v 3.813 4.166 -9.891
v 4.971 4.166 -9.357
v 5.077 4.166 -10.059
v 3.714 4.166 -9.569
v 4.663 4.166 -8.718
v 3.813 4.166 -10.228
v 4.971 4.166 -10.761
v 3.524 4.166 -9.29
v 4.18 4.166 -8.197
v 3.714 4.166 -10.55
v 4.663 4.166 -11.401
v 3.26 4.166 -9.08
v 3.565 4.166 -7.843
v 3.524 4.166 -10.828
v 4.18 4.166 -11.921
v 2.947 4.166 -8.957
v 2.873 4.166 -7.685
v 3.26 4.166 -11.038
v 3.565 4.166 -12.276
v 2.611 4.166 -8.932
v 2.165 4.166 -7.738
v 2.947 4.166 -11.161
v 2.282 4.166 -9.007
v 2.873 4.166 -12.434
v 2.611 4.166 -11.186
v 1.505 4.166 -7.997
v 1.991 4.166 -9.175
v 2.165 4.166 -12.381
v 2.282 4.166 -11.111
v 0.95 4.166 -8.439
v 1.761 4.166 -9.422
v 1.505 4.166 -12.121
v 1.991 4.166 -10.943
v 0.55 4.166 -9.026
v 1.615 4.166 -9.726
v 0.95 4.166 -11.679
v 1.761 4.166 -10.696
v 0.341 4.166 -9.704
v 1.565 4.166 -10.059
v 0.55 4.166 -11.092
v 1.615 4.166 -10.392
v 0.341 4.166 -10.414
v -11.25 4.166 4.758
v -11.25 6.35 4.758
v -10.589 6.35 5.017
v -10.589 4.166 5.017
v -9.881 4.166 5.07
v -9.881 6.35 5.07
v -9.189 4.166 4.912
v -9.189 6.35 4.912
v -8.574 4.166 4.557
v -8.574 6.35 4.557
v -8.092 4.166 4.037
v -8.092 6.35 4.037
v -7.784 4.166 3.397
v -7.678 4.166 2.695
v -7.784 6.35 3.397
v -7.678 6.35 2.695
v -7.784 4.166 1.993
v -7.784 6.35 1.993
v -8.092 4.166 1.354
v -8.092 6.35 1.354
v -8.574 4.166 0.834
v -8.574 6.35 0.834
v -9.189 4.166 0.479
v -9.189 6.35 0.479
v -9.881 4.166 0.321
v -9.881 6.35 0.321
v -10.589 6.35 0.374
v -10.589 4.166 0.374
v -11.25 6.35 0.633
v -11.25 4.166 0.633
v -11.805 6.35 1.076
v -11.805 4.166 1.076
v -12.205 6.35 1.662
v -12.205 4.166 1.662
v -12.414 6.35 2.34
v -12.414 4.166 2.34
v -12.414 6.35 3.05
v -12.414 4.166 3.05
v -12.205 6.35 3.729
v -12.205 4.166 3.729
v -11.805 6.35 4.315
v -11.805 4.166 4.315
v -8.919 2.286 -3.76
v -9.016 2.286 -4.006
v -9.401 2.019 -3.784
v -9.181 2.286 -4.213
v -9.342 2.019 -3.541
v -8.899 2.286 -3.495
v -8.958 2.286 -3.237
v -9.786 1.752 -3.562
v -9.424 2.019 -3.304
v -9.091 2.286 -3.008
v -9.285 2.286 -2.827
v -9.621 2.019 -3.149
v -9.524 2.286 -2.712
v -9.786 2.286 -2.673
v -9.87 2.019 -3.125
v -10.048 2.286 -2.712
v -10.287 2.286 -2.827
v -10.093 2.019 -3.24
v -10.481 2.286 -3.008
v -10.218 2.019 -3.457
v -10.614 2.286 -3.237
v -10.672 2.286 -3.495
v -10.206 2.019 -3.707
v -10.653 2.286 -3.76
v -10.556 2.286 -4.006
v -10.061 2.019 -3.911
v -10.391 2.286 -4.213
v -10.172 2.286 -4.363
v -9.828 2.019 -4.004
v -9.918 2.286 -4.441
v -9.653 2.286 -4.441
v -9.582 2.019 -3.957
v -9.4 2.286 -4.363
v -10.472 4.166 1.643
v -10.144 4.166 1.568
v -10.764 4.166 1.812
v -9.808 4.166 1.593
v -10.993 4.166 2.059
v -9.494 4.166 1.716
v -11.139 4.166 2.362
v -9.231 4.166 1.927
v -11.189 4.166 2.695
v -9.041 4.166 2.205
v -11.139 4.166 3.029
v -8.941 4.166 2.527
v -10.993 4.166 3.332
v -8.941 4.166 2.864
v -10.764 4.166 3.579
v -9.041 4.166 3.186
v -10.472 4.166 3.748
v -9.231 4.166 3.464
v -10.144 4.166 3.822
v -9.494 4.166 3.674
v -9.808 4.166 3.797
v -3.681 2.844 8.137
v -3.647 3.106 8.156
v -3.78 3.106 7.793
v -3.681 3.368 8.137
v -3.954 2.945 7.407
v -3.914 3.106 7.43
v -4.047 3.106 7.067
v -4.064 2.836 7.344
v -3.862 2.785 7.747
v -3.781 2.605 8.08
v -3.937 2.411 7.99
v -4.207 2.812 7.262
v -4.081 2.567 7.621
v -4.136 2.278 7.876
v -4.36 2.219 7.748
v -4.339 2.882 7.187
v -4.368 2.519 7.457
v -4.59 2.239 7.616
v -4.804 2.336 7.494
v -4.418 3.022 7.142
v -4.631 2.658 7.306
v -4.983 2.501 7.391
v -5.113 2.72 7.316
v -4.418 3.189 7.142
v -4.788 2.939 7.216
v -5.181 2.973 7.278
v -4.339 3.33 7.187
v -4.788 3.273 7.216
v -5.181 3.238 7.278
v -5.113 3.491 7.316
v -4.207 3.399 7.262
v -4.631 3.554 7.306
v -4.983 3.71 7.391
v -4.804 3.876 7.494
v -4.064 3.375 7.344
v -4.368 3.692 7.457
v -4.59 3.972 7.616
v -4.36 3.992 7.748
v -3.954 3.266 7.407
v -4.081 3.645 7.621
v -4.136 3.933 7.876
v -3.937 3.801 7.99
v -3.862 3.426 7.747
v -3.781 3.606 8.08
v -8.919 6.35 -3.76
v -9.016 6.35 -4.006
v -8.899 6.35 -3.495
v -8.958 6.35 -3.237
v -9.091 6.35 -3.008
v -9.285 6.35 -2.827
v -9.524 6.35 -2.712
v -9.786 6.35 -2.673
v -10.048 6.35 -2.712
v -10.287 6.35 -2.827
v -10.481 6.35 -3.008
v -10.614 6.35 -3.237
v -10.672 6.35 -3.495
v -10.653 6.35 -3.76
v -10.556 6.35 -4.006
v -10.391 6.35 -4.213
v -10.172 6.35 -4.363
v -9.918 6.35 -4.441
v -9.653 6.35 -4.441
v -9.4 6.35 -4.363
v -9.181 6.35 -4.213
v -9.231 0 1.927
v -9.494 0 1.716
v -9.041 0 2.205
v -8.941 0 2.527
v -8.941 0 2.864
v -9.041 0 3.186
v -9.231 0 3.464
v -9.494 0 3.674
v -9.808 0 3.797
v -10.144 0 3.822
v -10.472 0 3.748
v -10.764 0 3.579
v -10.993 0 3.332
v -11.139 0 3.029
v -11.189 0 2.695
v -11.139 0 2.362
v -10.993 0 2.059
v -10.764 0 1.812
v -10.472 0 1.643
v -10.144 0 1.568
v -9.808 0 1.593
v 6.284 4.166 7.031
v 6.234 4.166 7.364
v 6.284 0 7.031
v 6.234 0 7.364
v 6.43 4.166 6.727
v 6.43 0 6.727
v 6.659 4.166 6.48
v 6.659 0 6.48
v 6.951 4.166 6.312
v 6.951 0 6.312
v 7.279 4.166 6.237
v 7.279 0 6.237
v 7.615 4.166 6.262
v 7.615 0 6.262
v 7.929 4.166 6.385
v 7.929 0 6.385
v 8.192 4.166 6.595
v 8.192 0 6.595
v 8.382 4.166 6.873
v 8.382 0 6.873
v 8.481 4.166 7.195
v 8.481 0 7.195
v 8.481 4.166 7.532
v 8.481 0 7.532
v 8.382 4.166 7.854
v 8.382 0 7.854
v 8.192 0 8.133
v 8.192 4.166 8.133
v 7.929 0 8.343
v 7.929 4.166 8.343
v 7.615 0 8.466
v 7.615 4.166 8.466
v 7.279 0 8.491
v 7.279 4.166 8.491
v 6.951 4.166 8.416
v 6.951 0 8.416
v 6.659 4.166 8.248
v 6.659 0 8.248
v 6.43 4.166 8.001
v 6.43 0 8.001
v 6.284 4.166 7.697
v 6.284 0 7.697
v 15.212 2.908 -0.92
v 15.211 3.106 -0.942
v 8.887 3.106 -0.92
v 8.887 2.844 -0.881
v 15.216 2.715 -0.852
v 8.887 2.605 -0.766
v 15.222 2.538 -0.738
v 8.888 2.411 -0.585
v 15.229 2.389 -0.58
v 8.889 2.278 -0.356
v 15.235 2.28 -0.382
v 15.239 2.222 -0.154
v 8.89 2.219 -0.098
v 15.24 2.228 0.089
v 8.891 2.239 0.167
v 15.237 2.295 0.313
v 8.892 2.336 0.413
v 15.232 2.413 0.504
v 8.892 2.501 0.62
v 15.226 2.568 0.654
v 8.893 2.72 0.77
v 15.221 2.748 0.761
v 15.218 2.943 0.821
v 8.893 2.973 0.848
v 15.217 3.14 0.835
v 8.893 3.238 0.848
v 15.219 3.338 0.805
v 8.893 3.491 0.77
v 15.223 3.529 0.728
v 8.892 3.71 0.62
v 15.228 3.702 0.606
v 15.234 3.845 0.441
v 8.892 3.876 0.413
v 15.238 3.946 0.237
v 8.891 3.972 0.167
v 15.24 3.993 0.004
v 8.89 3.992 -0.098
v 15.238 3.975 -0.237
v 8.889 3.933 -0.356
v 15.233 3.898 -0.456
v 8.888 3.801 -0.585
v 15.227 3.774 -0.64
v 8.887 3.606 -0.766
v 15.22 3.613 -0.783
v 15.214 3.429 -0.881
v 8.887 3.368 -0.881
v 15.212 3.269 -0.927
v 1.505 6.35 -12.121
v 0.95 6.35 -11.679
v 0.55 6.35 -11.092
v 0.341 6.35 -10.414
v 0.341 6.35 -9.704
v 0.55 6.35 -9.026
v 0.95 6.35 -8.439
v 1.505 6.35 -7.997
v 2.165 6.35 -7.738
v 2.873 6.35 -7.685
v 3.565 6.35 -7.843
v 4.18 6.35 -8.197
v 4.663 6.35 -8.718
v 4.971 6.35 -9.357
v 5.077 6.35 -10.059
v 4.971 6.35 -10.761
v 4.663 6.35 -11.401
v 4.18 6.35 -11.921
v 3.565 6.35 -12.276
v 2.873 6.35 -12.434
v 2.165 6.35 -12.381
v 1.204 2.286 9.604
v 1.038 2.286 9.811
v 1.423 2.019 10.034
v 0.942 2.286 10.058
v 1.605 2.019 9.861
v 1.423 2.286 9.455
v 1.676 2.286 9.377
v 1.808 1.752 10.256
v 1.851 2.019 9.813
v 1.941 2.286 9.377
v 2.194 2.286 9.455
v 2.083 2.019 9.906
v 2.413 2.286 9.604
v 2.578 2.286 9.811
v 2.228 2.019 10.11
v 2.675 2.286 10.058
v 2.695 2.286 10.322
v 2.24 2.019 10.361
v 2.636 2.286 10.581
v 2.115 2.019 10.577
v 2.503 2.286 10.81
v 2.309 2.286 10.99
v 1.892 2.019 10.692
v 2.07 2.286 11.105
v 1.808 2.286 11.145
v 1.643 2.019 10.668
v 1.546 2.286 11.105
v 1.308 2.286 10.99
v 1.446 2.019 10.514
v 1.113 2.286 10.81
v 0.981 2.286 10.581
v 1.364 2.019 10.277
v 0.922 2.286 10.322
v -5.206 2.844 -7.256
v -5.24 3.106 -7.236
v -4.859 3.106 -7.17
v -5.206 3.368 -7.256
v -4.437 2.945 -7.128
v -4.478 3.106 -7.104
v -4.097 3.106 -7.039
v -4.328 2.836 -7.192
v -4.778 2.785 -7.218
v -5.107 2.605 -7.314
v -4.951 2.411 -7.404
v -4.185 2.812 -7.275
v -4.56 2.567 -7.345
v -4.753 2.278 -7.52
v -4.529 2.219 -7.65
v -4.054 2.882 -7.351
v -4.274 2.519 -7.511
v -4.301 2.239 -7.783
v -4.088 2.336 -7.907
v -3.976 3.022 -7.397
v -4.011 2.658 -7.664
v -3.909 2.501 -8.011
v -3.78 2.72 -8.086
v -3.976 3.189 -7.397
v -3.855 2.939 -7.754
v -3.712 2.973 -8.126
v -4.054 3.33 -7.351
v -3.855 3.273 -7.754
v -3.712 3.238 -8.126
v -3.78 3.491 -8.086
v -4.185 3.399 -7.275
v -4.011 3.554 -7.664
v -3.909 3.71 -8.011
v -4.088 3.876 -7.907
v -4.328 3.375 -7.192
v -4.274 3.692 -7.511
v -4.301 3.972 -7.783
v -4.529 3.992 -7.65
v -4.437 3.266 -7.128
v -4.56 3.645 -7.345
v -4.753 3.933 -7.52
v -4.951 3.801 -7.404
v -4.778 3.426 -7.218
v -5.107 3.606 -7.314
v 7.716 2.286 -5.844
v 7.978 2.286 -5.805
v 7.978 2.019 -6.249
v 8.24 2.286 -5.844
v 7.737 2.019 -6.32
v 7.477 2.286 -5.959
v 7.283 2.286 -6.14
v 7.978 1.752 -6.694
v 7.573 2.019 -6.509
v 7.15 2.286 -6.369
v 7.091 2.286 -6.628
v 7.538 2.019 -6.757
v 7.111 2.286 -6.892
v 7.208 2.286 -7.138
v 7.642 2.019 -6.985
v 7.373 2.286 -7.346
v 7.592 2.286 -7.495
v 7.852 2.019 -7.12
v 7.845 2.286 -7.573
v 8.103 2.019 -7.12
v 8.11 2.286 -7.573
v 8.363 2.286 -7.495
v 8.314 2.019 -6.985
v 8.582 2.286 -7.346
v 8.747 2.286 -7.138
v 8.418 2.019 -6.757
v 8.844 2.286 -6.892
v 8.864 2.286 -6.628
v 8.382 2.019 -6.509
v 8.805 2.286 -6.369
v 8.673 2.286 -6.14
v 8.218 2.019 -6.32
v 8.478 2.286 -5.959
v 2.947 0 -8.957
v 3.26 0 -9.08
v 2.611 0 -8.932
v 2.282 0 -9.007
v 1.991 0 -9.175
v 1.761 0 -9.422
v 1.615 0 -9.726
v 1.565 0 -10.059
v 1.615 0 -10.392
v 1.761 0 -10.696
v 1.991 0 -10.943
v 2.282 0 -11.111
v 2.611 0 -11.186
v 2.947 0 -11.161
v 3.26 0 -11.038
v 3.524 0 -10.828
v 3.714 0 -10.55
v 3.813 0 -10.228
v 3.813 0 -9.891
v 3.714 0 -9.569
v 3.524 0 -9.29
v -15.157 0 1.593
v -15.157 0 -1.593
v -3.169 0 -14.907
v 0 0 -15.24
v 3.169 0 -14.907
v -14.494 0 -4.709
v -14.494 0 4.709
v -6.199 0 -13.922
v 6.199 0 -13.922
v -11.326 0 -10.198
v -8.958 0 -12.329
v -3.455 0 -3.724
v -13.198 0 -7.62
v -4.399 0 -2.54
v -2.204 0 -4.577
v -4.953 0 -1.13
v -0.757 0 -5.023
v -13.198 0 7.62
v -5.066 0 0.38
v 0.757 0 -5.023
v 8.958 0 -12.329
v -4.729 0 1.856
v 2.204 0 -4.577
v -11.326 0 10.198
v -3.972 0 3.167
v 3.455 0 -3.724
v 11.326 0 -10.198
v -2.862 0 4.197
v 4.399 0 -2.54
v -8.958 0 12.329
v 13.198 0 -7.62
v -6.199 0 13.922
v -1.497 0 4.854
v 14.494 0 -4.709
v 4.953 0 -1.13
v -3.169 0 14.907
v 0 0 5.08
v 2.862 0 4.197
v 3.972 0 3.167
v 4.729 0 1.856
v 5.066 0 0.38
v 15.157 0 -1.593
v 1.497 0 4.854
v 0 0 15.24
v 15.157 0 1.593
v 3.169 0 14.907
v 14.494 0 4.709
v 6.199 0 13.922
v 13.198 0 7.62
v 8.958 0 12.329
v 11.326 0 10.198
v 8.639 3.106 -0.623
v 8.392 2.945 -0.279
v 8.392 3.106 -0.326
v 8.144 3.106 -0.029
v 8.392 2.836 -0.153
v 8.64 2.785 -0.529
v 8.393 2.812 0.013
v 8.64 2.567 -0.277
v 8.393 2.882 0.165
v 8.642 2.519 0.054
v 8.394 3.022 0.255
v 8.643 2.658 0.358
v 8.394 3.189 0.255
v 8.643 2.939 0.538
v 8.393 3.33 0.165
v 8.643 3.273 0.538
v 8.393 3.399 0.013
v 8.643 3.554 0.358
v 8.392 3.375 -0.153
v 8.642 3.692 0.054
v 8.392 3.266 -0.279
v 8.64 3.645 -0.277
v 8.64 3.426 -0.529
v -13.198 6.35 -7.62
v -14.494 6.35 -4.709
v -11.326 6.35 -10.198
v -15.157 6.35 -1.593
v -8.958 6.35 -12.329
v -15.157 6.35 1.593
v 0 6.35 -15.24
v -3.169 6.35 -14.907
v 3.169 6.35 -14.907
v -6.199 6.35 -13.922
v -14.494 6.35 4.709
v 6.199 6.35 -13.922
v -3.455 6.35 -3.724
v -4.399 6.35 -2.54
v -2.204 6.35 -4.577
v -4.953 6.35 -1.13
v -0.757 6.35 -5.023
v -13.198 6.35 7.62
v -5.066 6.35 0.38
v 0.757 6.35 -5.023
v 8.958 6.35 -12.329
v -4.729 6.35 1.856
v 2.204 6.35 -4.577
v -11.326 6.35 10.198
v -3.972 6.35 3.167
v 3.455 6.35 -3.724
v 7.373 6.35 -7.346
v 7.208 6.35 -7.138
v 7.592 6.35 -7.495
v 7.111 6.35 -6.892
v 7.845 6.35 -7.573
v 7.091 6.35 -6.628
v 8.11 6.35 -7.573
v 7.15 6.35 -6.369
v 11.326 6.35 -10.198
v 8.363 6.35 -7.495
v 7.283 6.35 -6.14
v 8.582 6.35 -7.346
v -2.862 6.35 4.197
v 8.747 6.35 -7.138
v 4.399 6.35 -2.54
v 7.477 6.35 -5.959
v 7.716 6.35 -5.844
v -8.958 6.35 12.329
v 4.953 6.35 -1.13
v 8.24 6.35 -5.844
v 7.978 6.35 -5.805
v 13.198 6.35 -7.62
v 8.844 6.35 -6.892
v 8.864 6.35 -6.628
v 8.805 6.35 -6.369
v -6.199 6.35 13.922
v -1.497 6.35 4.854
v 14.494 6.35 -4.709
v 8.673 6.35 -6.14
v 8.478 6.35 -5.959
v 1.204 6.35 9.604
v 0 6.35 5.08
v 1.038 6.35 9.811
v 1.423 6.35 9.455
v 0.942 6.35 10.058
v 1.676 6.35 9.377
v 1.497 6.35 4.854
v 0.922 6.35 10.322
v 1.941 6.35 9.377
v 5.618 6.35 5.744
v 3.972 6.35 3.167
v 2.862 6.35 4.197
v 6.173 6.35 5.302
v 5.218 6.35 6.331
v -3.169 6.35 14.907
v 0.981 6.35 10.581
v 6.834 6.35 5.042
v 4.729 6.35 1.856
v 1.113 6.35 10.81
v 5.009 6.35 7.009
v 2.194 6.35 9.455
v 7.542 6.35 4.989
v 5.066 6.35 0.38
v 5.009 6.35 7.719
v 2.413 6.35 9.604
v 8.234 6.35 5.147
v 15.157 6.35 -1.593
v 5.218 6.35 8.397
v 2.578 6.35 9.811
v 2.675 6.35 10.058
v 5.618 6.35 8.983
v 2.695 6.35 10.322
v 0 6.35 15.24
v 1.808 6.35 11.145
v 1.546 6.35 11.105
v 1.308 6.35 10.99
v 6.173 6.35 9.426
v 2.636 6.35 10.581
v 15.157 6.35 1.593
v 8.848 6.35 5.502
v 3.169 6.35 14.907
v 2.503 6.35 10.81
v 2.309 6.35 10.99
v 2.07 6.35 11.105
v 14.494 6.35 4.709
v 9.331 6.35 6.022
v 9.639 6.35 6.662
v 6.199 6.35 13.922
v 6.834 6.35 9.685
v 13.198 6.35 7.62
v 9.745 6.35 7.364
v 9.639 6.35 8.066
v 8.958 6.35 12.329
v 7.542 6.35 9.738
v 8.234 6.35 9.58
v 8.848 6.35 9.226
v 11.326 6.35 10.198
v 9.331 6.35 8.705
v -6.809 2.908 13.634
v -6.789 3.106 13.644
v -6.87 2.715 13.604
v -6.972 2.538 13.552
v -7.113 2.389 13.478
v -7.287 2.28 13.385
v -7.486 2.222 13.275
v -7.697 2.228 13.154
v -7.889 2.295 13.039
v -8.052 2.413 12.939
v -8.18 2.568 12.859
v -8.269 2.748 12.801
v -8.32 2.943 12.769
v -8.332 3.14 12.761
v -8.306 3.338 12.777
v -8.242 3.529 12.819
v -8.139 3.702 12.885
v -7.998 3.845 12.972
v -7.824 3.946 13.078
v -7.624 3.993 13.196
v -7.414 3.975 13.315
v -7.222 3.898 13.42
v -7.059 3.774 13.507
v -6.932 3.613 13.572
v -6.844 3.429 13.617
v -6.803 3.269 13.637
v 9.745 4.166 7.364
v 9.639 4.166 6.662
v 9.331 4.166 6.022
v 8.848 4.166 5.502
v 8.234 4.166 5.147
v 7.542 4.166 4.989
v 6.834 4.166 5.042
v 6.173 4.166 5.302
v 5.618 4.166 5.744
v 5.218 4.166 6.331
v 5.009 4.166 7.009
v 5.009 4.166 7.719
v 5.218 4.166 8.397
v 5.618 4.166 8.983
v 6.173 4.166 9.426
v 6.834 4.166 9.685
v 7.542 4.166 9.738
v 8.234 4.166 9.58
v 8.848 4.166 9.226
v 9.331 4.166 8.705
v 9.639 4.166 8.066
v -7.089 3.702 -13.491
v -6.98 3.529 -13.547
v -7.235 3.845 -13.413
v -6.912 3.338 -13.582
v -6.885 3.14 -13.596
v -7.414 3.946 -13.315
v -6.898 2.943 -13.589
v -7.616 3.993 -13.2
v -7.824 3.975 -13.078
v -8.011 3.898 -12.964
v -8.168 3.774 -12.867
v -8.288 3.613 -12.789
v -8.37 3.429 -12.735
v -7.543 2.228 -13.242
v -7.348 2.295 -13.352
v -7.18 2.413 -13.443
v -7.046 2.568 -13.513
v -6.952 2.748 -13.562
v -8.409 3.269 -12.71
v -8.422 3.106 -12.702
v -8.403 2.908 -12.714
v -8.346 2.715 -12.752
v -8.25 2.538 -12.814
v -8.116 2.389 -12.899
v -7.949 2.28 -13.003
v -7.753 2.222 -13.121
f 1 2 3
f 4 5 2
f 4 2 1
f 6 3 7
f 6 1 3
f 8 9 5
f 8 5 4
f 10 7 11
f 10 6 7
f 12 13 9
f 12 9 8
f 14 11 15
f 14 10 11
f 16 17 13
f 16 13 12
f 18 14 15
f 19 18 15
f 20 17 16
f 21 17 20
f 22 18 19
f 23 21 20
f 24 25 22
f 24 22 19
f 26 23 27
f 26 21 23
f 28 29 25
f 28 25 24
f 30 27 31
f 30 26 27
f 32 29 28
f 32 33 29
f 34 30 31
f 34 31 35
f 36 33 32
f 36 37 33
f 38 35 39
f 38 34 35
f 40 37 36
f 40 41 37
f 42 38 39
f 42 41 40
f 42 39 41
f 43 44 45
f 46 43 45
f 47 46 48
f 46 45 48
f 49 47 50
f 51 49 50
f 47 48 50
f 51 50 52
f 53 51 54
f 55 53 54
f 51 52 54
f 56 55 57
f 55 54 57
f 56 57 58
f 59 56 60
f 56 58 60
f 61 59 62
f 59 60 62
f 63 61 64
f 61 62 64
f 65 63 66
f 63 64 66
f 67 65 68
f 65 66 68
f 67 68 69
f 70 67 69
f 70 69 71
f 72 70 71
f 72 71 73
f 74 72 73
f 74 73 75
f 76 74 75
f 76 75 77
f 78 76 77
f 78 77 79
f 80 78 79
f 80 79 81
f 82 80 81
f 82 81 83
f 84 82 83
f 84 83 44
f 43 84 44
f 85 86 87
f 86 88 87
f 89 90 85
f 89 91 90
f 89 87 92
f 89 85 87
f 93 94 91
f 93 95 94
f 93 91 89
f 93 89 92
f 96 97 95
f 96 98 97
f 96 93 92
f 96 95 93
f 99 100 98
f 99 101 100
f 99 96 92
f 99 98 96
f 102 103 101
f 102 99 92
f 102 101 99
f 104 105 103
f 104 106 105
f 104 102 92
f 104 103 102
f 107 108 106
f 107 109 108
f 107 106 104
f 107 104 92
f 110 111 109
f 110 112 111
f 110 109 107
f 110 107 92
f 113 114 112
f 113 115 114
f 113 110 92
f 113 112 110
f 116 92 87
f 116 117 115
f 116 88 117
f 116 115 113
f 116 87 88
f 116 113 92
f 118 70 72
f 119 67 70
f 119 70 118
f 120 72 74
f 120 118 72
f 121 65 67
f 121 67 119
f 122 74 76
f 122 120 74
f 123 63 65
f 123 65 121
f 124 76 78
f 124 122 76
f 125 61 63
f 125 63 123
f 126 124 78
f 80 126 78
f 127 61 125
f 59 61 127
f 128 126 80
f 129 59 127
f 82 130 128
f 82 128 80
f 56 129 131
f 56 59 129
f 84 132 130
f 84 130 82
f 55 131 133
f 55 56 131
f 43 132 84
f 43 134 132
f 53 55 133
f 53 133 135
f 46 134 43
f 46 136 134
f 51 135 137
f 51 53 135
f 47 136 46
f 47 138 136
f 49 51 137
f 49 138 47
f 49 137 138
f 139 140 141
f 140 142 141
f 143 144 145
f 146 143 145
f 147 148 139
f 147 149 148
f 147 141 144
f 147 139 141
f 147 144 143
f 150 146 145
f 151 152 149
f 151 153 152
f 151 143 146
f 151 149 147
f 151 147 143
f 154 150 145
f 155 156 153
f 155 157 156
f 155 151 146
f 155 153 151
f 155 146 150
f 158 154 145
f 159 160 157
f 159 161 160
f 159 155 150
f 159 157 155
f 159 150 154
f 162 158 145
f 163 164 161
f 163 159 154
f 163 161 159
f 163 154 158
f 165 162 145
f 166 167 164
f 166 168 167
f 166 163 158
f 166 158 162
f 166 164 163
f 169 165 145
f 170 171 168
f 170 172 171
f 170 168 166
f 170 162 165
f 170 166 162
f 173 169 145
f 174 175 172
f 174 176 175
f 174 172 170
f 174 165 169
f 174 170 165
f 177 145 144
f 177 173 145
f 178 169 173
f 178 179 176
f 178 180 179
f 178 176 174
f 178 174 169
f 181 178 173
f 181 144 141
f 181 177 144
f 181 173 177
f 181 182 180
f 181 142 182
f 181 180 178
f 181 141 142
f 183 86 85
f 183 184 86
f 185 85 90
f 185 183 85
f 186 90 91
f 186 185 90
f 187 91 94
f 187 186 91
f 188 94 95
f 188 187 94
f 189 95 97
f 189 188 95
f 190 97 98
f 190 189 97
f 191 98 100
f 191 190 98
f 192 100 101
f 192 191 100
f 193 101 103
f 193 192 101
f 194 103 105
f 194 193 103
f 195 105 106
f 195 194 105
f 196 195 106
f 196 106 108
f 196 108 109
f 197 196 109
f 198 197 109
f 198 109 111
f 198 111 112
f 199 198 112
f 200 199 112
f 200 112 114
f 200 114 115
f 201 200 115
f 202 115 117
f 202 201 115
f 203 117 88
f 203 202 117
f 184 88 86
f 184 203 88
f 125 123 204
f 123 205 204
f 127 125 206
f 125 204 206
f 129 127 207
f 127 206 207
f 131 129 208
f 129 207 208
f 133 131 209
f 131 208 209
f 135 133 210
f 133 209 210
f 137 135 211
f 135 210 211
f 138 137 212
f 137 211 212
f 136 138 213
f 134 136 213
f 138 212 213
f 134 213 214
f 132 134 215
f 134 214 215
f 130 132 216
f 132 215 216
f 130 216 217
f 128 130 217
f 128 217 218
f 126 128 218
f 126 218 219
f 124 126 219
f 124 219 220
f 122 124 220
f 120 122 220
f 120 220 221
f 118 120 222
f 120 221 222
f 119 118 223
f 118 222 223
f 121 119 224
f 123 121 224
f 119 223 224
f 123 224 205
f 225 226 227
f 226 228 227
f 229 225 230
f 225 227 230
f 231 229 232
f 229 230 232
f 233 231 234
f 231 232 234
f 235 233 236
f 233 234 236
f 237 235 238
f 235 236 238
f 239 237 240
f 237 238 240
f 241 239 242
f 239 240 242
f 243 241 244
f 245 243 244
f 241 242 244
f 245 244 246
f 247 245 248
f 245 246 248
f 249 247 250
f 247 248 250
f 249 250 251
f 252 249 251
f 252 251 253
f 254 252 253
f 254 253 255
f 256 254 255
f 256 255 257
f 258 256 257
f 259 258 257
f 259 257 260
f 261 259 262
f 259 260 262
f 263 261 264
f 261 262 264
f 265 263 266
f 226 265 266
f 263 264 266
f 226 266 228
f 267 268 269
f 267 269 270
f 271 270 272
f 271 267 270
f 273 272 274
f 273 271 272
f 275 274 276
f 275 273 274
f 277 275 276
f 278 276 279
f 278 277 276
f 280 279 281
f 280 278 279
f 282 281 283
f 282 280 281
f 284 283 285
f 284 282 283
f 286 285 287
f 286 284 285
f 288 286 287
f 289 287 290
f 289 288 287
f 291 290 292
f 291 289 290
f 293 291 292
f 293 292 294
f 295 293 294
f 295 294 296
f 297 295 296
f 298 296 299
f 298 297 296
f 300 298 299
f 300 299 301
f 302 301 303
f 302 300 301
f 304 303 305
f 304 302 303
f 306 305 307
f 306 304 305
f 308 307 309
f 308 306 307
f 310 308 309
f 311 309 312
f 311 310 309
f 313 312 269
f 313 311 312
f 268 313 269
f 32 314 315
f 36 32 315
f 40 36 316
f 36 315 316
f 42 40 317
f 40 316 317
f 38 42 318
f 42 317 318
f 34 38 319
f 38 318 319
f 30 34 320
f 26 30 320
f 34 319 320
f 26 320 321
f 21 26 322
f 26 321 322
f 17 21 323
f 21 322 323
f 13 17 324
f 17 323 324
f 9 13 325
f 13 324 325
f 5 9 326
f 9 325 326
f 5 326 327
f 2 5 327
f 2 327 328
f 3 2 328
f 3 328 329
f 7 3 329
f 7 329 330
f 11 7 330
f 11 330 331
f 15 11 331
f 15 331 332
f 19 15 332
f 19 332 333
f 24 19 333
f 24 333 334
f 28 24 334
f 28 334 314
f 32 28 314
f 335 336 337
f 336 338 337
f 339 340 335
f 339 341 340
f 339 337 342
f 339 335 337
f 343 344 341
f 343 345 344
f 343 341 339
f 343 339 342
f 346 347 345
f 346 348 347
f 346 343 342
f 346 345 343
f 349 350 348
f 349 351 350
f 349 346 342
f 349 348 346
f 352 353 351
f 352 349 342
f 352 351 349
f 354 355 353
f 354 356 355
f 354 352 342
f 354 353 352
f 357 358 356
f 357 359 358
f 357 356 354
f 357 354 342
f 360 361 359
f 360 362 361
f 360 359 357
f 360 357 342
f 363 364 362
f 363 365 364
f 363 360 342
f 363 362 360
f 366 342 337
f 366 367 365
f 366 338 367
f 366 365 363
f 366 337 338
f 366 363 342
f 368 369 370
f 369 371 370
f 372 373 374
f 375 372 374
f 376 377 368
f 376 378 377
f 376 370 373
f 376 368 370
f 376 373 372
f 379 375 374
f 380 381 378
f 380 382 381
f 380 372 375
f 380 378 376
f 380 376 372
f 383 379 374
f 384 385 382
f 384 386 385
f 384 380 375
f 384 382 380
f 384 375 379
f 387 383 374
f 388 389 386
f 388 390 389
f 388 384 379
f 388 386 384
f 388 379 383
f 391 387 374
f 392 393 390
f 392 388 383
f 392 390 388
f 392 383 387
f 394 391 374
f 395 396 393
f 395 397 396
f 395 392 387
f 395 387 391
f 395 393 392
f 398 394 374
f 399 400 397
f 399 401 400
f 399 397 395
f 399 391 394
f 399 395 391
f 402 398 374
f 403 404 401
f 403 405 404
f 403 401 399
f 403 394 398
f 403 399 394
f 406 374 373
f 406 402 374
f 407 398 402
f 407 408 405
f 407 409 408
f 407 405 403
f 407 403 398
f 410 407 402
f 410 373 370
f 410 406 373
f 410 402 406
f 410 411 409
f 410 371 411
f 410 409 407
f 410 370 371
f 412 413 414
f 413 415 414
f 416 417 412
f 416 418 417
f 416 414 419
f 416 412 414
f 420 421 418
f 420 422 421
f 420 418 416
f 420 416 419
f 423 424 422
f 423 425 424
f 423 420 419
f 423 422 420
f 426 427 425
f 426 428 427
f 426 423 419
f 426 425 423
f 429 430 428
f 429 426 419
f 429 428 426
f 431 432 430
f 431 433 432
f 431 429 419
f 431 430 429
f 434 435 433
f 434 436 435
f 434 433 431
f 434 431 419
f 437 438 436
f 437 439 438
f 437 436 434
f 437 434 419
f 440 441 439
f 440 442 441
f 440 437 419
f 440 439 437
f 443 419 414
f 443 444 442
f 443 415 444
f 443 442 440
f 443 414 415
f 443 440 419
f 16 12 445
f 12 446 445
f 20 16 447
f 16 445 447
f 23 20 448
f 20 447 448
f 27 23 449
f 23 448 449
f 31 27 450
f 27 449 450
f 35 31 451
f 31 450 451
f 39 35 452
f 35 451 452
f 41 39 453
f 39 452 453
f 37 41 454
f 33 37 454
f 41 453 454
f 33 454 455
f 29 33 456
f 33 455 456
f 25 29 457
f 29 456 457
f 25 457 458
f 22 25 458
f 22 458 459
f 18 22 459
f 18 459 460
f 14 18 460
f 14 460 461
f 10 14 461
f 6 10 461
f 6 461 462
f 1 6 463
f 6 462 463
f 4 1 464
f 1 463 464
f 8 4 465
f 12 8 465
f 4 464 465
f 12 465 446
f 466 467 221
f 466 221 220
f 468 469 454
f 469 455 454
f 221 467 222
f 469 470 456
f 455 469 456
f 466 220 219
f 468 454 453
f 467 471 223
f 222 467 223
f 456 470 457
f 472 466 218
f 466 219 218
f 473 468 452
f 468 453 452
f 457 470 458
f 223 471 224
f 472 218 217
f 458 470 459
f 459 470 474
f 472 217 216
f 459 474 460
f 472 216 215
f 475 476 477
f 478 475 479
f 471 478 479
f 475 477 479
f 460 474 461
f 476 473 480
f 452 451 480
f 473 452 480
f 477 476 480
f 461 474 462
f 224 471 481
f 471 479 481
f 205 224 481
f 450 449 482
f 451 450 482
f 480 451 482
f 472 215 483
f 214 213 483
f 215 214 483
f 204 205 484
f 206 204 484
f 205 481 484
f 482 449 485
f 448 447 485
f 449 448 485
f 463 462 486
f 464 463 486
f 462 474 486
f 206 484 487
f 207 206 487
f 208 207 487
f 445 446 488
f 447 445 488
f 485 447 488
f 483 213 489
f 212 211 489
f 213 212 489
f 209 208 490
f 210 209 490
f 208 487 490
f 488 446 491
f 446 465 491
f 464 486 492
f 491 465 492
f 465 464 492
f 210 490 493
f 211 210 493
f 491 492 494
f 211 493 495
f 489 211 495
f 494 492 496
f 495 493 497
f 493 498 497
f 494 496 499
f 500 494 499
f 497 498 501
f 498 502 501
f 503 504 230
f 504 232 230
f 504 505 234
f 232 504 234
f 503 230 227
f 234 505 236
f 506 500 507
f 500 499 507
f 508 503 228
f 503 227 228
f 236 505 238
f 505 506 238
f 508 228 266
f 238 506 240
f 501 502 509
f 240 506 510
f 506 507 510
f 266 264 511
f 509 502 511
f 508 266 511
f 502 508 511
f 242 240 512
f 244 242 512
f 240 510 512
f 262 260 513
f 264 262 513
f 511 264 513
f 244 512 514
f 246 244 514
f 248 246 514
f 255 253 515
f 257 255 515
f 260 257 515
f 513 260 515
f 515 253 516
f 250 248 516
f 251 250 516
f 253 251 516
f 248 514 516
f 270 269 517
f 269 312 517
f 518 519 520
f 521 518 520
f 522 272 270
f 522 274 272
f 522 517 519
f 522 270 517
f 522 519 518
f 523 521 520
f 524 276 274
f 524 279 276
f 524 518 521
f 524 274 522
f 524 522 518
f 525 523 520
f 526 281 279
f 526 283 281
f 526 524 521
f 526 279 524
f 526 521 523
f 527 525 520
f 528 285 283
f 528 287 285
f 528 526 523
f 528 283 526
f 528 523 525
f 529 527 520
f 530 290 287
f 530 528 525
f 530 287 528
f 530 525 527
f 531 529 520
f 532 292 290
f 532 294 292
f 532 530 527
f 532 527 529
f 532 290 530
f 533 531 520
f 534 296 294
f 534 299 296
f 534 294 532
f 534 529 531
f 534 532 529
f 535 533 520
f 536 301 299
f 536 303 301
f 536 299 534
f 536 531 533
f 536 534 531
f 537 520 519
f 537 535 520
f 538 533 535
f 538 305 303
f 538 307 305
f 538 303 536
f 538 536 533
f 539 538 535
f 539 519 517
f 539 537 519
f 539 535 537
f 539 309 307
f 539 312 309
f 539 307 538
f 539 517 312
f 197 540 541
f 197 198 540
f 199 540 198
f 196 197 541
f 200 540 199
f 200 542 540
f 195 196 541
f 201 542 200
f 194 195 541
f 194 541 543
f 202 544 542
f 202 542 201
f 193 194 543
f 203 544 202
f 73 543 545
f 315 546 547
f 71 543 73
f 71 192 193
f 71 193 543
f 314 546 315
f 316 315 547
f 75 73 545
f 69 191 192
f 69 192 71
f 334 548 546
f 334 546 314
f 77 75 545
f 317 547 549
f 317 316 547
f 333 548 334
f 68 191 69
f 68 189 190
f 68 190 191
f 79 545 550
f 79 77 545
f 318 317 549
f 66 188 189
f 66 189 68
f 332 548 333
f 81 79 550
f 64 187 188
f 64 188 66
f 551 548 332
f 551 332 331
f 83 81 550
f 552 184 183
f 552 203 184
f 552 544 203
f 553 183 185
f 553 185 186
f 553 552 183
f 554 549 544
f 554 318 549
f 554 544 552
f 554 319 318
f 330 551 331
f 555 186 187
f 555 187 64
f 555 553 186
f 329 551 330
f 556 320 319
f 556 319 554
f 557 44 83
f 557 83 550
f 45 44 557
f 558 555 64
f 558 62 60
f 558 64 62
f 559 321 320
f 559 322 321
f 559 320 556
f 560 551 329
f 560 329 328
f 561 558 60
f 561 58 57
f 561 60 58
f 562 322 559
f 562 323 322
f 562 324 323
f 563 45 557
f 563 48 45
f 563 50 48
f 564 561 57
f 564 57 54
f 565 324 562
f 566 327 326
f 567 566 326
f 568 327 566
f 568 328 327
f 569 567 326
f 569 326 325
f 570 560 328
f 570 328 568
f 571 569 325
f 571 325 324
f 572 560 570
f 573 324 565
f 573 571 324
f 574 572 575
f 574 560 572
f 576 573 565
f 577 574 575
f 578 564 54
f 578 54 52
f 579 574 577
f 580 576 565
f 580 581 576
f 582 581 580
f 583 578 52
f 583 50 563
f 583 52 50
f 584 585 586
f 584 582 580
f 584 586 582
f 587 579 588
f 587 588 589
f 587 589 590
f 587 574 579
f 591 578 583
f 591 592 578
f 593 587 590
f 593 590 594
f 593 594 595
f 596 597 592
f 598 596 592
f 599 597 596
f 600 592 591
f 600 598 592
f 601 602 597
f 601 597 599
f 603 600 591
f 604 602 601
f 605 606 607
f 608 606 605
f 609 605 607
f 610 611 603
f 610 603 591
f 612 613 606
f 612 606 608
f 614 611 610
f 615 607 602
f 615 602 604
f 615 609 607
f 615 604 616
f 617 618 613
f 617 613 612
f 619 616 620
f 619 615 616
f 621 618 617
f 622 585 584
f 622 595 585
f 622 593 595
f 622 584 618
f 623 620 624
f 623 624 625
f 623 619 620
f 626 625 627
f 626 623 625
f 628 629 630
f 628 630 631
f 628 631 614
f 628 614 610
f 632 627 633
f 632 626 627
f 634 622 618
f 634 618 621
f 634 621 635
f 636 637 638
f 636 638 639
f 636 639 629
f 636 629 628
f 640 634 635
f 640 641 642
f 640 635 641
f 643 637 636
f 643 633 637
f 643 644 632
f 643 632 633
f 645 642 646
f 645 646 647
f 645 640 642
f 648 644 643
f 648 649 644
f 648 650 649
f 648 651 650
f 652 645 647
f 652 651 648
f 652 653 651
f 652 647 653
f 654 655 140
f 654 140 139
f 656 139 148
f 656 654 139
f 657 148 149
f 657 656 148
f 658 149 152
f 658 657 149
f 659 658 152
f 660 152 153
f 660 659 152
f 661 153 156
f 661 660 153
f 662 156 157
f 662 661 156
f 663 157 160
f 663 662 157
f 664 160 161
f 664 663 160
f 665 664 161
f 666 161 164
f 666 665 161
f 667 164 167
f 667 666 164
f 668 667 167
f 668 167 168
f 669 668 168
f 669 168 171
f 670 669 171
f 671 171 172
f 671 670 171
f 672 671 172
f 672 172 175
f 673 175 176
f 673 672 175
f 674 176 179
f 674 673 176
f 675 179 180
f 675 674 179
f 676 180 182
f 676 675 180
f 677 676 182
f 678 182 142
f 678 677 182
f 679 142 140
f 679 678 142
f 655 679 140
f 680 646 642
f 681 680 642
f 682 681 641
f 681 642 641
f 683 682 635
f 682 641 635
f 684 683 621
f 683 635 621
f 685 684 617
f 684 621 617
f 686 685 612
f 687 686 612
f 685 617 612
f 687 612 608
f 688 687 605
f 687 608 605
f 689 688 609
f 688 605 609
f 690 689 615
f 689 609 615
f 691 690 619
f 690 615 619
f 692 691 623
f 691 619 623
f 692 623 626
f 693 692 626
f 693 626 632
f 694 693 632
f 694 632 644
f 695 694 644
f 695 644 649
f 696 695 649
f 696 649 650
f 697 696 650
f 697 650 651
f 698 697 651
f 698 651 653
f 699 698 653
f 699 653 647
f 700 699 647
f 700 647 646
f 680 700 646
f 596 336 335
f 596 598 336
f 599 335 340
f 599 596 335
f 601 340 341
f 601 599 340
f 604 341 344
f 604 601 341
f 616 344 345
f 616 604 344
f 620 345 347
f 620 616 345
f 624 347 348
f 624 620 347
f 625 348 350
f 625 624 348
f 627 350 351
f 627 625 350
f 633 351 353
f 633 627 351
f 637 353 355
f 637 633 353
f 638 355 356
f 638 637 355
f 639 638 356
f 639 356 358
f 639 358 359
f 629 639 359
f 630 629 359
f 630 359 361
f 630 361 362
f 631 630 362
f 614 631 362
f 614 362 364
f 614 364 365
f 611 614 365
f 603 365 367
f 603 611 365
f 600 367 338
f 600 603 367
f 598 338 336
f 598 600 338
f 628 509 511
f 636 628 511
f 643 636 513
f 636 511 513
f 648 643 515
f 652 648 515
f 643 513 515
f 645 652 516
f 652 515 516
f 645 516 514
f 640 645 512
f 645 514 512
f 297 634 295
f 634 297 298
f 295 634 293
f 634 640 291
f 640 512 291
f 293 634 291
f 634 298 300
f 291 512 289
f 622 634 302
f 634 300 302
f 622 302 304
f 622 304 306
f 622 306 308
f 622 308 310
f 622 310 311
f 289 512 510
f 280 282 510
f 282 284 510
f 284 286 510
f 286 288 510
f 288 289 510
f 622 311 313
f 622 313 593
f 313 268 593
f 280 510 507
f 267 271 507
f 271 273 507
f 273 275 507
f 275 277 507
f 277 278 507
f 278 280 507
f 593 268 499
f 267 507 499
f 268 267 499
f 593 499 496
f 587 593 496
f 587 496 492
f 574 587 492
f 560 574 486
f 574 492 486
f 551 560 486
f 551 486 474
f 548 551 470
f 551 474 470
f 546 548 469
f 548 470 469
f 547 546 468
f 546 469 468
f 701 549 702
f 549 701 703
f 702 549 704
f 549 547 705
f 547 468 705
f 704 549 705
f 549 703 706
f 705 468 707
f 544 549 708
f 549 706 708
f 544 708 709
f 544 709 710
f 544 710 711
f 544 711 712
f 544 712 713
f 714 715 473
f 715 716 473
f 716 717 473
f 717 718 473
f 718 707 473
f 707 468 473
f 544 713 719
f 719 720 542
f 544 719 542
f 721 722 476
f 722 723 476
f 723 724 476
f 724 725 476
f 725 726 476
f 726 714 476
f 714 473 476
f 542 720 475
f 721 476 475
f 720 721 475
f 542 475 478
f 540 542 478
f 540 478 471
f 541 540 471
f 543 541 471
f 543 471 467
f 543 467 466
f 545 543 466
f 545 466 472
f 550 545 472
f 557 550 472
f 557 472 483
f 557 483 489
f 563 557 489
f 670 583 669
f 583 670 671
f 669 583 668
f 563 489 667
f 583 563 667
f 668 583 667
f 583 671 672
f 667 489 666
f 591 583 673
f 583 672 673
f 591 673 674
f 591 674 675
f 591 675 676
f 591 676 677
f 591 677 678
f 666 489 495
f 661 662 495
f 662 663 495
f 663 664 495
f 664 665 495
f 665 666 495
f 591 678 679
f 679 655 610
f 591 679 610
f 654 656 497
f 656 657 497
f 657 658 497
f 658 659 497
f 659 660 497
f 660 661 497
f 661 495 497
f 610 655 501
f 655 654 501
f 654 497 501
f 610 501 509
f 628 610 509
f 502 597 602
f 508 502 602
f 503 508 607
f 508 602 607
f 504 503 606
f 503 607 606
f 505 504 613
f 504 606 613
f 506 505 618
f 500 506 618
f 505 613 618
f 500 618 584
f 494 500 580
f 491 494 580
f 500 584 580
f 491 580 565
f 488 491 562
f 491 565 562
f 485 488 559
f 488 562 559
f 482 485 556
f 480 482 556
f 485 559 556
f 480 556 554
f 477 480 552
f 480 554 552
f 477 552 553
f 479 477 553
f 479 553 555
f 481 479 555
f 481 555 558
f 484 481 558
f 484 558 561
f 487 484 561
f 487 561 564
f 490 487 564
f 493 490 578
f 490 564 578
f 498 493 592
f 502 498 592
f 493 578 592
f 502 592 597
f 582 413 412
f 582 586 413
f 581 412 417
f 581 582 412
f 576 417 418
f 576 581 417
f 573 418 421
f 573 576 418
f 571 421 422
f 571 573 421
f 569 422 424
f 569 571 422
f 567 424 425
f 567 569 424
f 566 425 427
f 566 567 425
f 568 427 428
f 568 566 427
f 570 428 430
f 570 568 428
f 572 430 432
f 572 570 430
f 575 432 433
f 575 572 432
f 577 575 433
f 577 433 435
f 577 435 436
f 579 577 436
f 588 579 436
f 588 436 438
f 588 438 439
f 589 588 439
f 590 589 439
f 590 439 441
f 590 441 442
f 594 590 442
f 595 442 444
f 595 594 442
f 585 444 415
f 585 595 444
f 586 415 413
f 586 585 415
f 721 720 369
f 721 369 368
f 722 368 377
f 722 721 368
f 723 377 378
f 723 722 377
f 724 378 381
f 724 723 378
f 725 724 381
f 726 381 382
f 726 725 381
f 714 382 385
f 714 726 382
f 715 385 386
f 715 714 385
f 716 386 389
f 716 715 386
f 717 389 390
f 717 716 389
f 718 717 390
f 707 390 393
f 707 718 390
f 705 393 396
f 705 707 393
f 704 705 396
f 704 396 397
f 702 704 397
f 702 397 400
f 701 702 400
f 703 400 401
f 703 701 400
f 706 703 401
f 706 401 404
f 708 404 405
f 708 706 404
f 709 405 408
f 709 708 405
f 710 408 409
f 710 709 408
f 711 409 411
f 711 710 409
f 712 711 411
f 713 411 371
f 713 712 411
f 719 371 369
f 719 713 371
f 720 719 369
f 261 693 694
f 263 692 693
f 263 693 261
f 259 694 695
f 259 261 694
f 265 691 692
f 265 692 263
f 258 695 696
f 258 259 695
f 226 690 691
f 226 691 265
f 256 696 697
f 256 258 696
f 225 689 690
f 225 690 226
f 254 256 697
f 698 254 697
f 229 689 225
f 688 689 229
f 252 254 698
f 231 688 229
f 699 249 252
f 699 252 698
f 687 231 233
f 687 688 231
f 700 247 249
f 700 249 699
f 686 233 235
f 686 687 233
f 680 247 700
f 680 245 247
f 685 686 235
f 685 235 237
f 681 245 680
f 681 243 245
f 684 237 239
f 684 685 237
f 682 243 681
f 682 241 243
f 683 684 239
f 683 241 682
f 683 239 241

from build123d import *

# Parameters (mm, degrees)
SKETCH1_R                                      = 15.24
BOSS_EXTRUDE1_DEPTH                            = 6.35
CBORE_FOR_2_SOCKET_HEAD_CAP_SCREW1_D           = 2.2606
CBORE_FOR_2_SOCKET_HEAD_CAP_SCREW1_CBORE_D     = 4.7625
CBORE_FOR_2_SOCKET_HEAD_CAP_SCREW1_CBORE_DEPTH = 2.1844
CIRPATTERN1_COUNT                              = 3
CIRPATTERN2_COUNT                              = 3
CIRPATTERN3_COUNT                              = 3
SKETCH16_R                                     = 5.08
CUT_EXTRUDE1_DEPTH                             = 6.35


with BuildPart() as part:
    # Sketch1 → Boss-Extrude1 (new body)
    with BuildSketch(Plane(origin=(0, 0, 0), x_dir=(1, 0, 0), z_dir=(0, 1, 0))):
        with Locations(Location((0, 0, 0), (0, 0, 270))):
            Circle(SKETCH1_R)
    extrude(amount=BOSS_EXTRUDE1_DEPTH)

    # CBORE for #2 Socket Head Cap Screw1 (through all)
    with Locations(Plane(origin=(0, 6.35, 0), x_dir=(1, 0, 0), z_dir=(0, 1, 0))):
        with Locations((7.363810019, -7.363810019)):
            cbore_for_2_socket_head_cap_screw1 = CounterBoreHole(CBORE_FOR_2_SOCKET_HEAD_CAP_SCREW1_D / 2, CBORE_FOR_2_SOCKET_HEAD_CAP_SCREW1_CBORE_D / 2, CBORE_FOR_2_SOCKET_HEAD_CAP_SCREW1_CBORE_DEPTH)

    # CirPattern1: CBORE for #2 Socket Head Cap Screw1 ×3 about axis
    cirpattern1_axis = Axis((0, 0, 0), (0, 1, 0))
    for i in range(1, CIRPATTERN1_COUNT):
        add(cbore_for_2_socket_head_cap_screw1.rotate(cirpattern1_axis, i * 360 / CIRPATTERN1_COUNT), mode=Mode.SUBTRACT)

    # Sketch10 → Tap Drill for #2-56 Tap2 (revolve, cut)
    with BuildSketch(Plane(origin=(7.977586831, 6.35, -6.693990167), x_dir=(0, 0, 1), z_dir=(1, 0, 0))):
        Polygon((0, 0), (0, 4.59816509), (0.889, 4.064), (0.889, 0), align=None)
    tap_drill_for_2_56_tap2 = revolve(axis=Axis((7.977586831, 12.7, -6.693990167), (0, -1, 0)), mode=Mode.SUBTRACT)

    # CirPattern2: Tap Drill for #2-56 Tap2 ×3 about axis
    cirpattern2_axis = Axis((0, 0, 0), (0, 1, 0))
    for i in range(1, CIRPATTERN2_COUNT):
        add(tap_drill_for_2_56_tap2.rotate(cirpattern2_axis, i * 360 / CIRPATTERN2_COUNT), mode=Mode.SUBTRACT)

    # Sketch15 → Tap Drill for #2-56 Tap1 (revolve, cut)
    with BuildSketch(Plane(origin=(-7.57363795, 3.105629072, 13.224885943), x_dir=(0.8677746681735182, 0, 0.49695787072581954), z_dir=(0, 1, 0))):
        Polygon((0, 0), (0, 7.095959572), (0.889, 6.35), (0.889, 0), align=None)
    tap_drill_for_2_56_tap1 = revolve(axis=Axis((-10.729320429, 3.105629072, 18.735255086), (0.4969578707258196, 0, -0.8677746681735182)), mode=Mode.SUBTRACT)

    # CirPattern3: Tap Drill for #2-56 Tap1 ×3 about axis
    cirpattern3_axis = Axis((0, 6.35, 0), (0, -1, 0))
    for i in range(1, CIRPATTERN3_COUNT):
        add(tap_drill_for_2_56_tap1.rotate(cirpattern3_axis, i * 360 / CIRPATTERN3_COUNT), mode=Mode.SUBTRACT)

    # Sketch16 → Cut-Extrude1 (cut)
    with BuildSketch(Plane(origin=(0, 6.35, 0), x_dir=(1, 0, 0), z_dir=(0, 1, 0))):
        with Locations(Location((0, 0, 0), (0, 0, 270))):
            Circle(SKETCH16_R)
    extrude(amount=-CUT_EXTRUDE1_DEPTH, mode=Mode.SUBTRACT)


solid = part.part
